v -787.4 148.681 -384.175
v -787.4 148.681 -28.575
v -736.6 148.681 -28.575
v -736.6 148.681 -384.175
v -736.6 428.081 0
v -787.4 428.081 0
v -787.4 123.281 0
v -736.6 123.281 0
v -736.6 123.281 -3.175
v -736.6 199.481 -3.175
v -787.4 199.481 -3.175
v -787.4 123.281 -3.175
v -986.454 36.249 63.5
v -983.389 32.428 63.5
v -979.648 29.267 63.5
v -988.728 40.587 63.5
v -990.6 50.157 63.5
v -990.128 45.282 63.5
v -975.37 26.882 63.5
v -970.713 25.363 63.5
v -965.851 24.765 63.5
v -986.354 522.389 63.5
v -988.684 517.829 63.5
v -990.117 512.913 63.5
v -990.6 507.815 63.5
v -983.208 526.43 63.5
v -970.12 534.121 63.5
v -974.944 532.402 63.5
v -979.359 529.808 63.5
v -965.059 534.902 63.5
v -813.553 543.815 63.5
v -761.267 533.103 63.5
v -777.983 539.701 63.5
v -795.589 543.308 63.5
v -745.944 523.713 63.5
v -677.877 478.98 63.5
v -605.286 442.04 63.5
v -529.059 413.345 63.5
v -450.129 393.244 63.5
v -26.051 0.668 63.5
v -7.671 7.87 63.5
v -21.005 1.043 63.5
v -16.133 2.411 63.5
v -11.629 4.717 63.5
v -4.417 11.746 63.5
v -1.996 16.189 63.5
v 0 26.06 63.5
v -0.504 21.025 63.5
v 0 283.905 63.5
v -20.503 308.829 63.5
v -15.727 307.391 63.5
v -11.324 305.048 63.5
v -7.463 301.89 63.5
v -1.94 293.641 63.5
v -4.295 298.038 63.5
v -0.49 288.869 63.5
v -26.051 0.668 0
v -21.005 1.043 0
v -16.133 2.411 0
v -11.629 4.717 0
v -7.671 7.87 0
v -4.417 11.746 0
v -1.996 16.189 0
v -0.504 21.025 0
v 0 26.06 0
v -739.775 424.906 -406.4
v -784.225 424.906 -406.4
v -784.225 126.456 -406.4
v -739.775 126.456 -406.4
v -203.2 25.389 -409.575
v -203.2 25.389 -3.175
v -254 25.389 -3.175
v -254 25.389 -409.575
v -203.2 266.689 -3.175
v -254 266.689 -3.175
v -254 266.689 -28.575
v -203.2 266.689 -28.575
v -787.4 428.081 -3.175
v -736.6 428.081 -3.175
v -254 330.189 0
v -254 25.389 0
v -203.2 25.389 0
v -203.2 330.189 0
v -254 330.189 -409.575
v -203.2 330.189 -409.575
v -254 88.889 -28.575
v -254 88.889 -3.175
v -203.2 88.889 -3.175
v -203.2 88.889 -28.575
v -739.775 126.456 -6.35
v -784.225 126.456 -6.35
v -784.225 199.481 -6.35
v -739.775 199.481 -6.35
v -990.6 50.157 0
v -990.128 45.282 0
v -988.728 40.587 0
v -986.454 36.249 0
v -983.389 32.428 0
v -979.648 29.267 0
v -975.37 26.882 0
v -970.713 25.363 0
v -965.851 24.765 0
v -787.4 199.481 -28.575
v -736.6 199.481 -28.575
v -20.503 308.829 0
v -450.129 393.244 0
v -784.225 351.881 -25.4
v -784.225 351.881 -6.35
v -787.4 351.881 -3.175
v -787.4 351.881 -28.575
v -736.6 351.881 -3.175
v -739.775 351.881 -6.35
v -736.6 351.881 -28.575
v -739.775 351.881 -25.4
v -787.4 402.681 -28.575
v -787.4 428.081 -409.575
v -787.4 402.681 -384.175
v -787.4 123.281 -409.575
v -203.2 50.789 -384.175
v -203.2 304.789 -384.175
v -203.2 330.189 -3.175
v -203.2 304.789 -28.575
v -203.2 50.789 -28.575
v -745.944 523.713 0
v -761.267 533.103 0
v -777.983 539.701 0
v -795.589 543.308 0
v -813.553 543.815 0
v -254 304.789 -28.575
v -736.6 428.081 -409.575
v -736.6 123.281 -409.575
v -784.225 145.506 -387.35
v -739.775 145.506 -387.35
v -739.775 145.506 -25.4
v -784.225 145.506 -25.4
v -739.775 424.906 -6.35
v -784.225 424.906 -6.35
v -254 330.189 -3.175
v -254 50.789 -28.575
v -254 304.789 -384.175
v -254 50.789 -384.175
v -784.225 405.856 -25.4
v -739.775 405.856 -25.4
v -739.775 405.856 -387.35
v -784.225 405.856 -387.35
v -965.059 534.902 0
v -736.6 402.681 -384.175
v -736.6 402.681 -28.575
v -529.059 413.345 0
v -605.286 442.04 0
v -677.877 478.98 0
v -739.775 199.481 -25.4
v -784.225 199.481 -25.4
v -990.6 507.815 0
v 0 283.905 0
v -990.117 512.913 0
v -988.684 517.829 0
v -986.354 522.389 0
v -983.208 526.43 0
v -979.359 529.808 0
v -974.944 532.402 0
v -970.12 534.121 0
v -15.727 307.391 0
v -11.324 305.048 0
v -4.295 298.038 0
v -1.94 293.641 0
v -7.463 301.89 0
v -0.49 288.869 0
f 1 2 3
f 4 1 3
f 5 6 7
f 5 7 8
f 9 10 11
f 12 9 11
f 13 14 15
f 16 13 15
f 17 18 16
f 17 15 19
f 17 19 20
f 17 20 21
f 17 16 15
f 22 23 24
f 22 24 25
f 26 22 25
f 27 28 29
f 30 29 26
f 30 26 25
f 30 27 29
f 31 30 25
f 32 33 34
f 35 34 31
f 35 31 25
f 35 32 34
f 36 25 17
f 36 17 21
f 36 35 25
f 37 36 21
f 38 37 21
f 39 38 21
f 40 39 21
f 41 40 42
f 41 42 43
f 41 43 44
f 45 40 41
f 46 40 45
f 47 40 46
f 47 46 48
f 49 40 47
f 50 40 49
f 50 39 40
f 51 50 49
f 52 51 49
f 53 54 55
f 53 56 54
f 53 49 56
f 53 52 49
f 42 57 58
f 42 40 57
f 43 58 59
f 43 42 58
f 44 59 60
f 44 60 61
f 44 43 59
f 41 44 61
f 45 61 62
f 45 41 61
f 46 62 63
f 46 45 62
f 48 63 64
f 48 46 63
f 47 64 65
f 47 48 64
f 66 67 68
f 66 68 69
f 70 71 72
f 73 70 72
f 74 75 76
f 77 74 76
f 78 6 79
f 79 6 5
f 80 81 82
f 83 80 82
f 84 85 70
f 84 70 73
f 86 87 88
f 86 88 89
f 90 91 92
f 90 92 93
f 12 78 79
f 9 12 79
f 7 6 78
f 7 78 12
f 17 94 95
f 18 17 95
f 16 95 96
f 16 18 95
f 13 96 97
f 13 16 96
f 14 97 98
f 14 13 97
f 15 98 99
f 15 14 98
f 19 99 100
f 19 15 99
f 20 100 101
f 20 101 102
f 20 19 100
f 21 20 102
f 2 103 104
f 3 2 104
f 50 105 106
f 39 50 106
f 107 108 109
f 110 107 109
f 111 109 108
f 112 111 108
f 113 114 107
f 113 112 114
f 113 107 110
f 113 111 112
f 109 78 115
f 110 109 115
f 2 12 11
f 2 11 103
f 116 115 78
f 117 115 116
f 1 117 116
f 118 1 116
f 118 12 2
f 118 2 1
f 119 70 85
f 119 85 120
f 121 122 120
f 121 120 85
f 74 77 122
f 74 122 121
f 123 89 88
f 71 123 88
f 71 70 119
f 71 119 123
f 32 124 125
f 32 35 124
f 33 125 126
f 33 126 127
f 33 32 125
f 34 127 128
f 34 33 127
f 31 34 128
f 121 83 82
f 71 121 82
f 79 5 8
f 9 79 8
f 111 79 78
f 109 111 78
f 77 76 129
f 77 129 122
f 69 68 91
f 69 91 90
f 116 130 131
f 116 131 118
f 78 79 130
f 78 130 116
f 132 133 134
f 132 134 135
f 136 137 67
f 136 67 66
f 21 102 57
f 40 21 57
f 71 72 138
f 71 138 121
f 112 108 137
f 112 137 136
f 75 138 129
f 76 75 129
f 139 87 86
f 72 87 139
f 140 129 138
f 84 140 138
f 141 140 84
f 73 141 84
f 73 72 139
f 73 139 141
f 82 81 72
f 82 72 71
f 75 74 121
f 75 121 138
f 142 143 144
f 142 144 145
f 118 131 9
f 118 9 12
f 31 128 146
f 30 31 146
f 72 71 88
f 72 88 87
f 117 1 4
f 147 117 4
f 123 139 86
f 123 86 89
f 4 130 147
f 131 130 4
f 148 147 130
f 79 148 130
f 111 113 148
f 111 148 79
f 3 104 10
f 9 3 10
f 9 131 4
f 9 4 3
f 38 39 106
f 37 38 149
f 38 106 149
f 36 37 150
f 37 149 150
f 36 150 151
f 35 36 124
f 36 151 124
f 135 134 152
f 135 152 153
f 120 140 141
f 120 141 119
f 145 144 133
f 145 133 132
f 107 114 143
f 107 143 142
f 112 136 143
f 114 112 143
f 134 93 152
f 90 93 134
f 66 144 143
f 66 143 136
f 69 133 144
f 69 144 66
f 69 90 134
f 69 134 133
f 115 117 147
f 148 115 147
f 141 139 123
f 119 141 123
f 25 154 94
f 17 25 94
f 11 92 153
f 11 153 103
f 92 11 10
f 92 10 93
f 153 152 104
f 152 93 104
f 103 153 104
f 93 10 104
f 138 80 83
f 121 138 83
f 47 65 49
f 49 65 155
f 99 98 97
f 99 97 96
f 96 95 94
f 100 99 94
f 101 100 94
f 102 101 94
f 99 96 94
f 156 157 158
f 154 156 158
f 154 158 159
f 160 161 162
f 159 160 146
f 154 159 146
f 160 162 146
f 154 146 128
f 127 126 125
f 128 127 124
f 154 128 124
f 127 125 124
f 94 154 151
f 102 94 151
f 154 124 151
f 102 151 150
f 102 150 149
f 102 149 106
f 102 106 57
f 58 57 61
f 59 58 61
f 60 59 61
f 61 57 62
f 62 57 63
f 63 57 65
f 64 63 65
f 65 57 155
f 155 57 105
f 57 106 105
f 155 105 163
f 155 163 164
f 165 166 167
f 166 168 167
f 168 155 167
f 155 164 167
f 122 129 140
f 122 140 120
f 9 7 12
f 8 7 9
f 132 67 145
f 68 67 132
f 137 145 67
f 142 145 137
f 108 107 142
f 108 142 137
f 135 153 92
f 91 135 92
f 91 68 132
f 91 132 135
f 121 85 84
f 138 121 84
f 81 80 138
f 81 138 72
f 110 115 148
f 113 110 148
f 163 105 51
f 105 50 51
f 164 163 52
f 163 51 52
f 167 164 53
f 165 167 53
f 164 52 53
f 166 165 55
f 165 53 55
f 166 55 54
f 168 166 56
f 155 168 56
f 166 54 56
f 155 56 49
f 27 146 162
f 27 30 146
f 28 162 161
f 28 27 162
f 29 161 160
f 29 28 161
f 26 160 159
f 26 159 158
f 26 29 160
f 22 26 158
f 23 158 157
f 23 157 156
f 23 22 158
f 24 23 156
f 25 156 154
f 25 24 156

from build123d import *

# Parameters (mm, degrees)
F1_DEPTH    = 63.5
F3_T1_DEPTH = 63.5
F2_W        = 50.8
F2_H        = 304.8
F4_DEPTH    = 3.175
F7_W        = 50.8
F7_H        = 25.4
F7_W_2      = 44.45
F7_H_2      = 19.05
F11_W       = 50.8
F11_H       = 25.4
F13_R       = 103.4882786099
F14_R       = 27.1342571694
F15_R       = 25.4


# Not quite as in the source:
# - a fillet or chamfer that OpenCascade refuses, or shapes differently, is made with other operations: its cross-section is extruded or revolved along the edge and cut away or added


with BuildPart() as f1:
    # F0 (on Top) → F1 (new body)
    with BuildSketch(Plane.XY):
        Polygon((-990.6, 25.4), (0, 0), (0, 304.8), (-678.6715388298, 438.15), (-774.7, 546.1), (-990.6, 533.4), align=None)
    extrude(amount=F1_DEPTH)

    # F3: fillet of radius 736.2487387041 on 1 edges, made by hand

    # F3_s2 → F3_t1 (join)
    with BuildSketch(Plane.XY):
        with BuildLine():
            ThreePointArc((-450.1285521095, 393.2443195118), (-621.8672665328, 449.5998222637), (-774.7, 546.1))
            Line((-774.7, 546.1), (-678.6715388298, 438.15))
            Line((-678.6715388298, 438.15), (-450.1285521095, 393.2443195118))
        make_face()
    extrude(amount=F3_T1_DEPTH)

    # F13
    f13_edges = [f1.edges().sort_by_distance(p)[0] for p in [
        (-774.7, 546.1, 31.75),
    ]]
    fillet(f13_edges, radius=F13_R)

    # F14
    f14_edges = [f1.edges().sort_by_distance(p)[0] for p in [
        (-990.6, 533.4, 31.75),
    ]]
    fillet(f14_edges, radius=F14_R)

    # F15
    f15_edges = [f1.edges().sort_by_distance(p)[0] for p in [
        (-990.6, 25.4, 31.75),
        (0, 0, 31.75),
        (0, 304.8, 31.75),
    ]]
    fillet(f15_edges, radius=F15_R)


with BuildPart() as f4:
    # F2 (on face) → F4 (new body)
    with BuildSketch(Plane(origin=(0, 0, 0), x_dir=(1, 0, 0), z_dir=(0, 0, -1))):
        with Locations((-228.6, -177.7892106534)):
            Rectangle(F2_W, F2_H)
    extrude(amount=F4_DEPTH)


with BuildPart() as f4b:
    # F2 (on face) → F4, piece 2 (new body)
    with BuildSketch(Plane(origin=(0, 0, 0), x_dir=(1, 0, 0), z_dir=(0, 0, -1))):
        with Locations((-762, -275.6809043643)):
            Rectangle(F2_W, F2_H)
    extrude(amount=F4_DEPTH)


with BuildPart() as f8:
    # F8: sweep along a path in F5
    with BuildLine(Plane(origin=(-787.4, 0, 0), x_dir=(0, -1, 0), z_dir=(-1, 0, 0))) as f8_path:
        Line((-199.4809043643, -3.175), (-123.2809043643, -3.175))
        Line((-123.2809043643, -3.175), (-123.2809043643, -409.575))
        Line((-123.2809043643, -409.575), (-428.0809043643, -409.575))
        Line((-428.0809043643, -409.575), (-428.0809043643, -3.175))
        Line((-428.0809043643, -3.175), (-351.8809043643, -3.175))
    # F7 (on line) → F8 (sweep)
    with BuildSketch(Plane.XZ.offset(-351.8809043643)):
        with Locations((-762, -15.875)):
            Rectangle(F7_W, F7_H)
        with Locations((-762, -15.875)):
            Rectangle(F7_W_2, F7_H_2, mode=Mode.SUBTRACT)
    sweep(path=f8_path.line, transition=Transition.RIGHT)


with BuildPart() as f12:
    # F12: sweep along a path in F9
    with BuildLine(Plane.YZ.offset(-203.2)) as f12_path:
        Line((88.8892106534, -3.175), (25.3892106534, -3.175))
        Line((25.3892106534, -3.175), (25.3892106534, -409.575))
        Line((25.3892106534, -409.575), (330.1892106534, -409.575))
        Line((330.1892106534, -409.575), (330.1892106534, -3.175))
        Line((330.1892106534, -3.175), (266.6892106534, -3.175))
    # F11 (on line) → F12 (sweep)
    with BuildSketch(Plane.XZ.offset(-88.8892106534)):
        with Locations((-228.6, -15.875)):
            Rectangle(F11_W, F11_H)
    sweep(path=f12_path.line, transition=Transition.RIGHT)


solid = Compound([f1.part, f4.part, f4b.part, f8.part, f12.part])
